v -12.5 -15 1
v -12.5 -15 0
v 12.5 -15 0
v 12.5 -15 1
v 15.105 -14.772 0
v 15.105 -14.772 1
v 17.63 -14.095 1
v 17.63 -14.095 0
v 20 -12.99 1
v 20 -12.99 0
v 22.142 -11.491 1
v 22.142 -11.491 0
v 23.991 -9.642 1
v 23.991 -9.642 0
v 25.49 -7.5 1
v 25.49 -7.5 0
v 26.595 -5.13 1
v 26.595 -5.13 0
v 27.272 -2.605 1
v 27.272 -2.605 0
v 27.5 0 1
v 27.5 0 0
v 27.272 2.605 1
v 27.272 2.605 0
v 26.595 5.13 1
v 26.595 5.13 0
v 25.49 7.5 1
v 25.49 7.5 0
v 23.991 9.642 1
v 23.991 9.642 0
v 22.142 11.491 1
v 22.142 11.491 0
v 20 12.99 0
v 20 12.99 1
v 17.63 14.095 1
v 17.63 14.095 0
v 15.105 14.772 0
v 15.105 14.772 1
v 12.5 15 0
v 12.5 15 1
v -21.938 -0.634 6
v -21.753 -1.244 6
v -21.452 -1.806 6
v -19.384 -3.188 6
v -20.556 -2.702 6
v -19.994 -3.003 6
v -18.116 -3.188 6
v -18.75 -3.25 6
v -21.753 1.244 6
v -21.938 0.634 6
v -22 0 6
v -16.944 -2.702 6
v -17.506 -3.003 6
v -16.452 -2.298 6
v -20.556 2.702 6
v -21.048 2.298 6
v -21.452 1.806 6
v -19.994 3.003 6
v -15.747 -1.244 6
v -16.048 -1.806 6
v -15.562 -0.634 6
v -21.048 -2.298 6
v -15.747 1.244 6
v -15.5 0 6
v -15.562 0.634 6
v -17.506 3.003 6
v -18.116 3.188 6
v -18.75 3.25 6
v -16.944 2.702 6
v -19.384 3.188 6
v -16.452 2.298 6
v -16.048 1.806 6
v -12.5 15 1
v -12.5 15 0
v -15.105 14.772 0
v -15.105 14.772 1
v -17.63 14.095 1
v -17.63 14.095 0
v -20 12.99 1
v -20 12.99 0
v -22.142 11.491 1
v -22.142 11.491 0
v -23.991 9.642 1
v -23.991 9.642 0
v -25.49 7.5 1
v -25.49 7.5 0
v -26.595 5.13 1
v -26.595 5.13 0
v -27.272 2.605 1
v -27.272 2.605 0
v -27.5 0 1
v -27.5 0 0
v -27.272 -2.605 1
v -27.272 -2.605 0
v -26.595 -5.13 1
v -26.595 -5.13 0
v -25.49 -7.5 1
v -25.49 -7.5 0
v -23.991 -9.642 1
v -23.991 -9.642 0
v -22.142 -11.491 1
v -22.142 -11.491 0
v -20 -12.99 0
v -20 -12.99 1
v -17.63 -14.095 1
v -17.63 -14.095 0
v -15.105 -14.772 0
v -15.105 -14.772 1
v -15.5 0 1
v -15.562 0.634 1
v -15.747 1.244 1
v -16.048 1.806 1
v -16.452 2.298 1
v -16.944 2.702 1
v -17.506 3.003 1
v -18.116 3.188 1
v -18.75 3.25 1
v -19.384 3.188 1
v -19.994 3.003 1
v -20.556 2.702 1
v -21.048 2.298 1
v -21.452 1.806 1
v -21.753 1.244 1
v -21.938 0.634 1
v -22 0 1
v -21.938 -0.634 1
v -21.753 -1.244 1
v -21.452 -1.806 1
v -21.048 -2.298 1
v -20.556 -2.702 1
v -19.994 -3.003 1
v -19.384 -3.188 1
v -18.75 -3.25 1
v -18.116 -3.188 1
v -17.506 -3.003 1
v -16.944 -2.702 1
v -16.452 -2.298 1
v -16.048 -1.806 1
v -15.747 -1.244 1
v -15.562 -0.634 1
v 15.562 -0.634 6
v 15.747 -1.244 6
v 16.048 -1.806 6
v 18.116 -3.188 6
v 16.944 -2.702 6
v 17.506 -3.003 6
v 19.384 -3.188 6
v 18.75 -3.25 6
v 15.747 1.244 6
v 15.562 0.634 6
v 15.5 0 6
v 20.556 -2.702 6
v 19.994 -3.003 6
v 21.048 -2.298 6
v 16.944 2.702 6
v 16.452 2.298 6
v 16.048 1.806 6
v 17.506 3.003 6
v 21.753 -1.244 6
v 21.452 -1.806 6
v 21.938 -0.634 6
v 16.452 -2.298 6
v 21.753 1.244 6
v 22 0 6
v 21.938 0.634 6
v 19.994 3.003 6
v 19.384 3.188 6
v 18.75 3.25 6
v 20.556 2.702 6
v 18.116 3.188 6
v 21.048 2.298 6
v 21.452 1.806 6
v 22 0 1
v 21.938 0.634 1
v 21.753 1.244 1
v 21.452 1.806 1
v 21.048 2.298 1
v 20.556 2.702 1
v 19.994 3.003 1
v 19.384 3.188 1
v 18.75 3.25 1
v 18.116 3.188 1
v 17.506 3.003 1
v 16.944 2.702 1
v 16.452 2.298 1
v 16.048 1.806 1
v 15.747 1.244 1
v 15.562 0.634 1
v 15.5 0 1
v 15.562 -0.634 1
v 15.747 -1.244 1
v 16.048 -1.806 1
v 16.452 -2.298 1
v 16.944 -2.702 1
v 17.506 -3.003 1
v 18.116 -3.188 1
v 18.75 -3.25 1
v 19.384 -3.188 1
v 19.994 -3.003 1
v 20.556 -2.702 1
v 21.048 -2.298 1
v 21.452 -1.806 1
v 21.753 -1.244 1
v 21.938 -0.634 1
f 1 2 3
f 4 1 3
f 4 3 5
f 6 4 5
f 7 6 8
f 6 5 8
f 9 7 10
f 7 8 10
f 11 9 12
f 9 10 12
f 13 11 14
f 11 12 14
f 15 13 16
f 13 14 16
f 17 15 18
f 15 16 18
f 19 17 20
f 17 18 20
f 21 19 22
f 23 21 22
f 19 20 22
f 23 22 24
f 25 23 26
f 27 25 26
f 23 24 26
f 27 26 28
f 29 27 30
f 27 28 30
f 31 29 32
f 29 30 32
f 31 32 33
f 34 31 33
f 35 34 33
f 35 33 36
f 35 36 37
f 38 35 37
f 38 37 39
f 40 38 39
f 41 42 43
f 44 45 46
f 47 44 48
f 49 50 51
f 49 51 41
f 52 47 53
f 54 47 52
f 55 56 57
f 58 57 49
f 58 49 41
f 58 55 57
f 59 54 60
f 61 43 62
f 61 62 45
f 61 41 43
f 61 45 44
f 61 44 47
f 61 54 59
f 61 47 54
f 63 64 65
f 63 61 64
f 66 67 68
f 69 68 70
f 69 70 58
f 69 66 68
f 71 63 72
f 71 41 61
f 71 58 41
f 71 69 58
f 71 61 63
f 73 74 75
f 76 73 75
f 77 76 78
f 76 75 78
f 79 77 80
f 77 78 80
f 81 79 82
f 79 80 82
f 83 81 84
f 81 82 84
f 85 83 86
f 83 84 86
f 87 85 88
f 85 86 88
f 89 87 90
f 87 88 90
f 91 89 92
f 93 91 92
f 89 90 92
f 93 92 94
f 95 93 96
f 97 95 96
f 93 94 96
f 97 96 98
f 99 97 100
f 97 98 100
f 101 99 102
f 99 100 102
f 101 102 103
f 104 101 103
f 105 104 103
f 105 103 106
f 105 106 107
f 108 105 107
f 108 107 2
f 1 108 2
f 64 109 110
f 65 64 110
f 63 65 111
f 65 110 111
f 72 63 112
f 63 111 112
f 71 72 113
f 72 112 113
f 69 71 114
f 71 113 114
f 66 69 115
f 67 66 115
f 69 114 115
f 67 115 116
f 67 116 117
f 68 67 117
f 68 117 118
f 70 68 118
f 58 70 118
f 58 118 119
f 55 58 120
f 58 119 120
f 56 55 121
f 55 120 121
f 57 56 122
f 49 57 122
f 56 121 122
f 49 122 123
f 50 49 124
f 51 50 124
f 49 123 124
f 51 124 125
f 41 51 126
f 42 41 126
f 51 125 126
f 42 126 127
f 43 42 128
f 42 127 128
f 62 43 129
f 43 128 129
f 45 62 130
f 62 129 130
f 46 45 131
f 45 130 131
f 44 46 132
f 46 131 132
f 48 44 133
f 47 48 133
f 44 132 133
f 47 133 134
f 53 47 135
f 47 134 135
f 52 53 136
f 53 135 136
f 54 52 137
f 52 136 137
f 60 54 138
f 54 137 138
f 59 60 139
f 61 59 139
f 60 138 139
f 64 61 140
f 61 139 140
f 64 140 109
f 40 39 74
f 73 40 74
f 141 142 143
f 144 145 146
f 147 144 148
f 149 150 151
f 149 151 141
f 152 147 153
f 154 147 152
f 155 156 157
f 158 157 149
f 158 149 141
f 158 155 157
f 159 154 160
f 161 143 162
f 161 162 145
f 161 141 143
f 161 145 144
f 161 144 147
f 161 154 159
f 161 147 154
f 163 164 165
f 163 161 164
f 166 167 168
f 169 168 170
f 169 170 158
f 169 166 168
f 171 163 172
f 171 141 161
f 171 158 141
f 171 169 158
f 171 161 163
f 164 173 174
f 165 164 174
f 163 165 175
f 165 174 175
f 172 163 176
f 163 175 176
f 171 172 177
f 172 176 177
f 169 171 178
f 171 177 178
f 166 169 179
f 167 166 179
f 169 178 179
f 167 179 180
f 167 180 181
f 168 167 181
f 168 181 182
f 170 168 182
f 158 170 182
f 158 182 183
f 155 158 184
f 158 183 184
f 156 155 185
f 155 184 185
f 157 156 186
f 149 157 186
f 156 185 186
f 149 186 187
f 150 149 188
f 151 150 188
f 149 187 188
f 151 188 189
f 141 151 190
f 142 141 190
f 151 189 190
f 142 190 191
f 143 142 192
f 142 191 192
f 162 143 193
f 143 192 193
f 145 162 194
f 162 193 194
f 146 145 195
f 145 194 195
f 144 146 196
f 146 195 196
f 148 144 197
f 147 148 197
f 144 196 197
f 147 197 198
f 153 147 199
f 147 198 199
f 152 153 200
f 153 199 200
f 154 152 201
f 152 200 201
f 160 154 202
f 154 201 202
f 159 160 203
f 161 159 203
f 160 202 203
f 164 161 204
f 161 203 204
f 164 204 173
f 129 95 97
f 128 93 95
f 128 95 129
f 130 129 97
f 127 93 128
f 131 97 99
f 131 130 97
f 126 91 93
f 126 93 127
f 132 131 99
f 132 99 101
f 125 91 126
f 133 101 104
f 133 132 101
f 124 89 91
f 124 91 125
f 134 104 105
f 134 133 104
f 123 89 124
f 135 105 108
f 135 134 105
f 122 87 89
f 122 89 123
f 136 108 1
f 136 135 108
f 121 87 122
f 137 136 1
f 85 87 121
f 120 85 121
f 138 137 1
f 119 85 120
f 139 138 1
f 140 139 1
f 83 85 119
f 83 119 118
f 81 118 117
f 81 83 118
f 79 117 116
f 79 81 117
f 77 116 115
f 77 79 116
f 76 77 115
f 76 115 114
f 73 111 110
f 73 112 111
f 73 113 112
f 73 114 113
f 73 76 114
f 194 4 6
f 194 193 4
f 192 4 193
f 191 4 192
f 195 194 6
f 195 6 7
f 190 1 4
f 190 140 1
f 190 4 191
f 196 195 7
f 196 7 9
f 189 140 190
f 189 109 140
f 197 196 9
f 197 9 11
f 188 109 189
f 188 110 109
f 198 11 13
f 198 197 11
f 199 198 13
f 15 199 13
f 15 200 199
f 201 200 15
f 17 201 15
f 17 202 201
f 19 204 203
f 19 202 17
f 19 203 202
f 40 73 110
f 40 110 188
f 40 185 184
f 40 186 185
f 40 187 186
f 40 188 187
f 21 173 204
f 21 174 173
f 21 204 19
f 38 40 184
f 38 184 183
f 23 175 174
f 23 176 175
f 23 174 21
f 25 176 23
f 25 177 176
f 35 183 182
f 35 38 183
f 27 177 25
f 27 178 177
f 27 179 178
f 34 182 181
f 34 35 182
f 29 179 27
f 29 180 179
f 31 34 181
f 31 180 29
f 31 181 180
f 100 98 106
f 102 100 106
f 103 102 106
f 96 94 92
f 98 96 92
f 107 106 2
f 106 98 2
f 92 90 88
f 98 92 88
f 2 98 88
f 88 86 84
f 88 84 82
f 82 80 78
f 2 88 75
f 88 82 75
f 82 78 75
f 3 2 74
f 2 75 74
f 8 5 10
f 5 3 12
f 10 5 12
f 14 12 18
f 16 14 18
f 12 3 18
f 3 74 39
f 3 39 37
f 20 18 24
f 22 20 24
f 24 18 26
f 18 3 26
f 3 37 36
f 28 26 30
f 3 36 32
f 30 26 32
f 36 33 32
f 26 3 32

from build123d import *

# Parameters (mm, degrees)
F1_DEPTH = 1
F2_R     = 3.25
F3_DEPTH = 5


with BuildPart() as f1:
    # F0 (on Top) → F1 (new body)
    with BuildSketch(Plane.XY):
        with BuildLine():
            Line((12.5, 15), (-12.5, 15))
            ThreePointArc((-12.5, 15), (-27.5, 0), (-12.5, -15))
            Line((-12.5, -15), (12.5, -15))
            ThreePointArc((12.5, -15), (27.5, 0), (12.5, 15))
        make_face()
    extrude(amount=F1_DEPTH)

    # F2 (on face) → F3 (join)
    with BuildSketch(Plane.XY.offset(1)):
        with Locations((-18.75, 0)):
            Circle(F2_R)
        with Locations((18.75, 0)):
            Circle(F2_R)
    extrude(amount=F3_DEPTH)


solid = f1.part
